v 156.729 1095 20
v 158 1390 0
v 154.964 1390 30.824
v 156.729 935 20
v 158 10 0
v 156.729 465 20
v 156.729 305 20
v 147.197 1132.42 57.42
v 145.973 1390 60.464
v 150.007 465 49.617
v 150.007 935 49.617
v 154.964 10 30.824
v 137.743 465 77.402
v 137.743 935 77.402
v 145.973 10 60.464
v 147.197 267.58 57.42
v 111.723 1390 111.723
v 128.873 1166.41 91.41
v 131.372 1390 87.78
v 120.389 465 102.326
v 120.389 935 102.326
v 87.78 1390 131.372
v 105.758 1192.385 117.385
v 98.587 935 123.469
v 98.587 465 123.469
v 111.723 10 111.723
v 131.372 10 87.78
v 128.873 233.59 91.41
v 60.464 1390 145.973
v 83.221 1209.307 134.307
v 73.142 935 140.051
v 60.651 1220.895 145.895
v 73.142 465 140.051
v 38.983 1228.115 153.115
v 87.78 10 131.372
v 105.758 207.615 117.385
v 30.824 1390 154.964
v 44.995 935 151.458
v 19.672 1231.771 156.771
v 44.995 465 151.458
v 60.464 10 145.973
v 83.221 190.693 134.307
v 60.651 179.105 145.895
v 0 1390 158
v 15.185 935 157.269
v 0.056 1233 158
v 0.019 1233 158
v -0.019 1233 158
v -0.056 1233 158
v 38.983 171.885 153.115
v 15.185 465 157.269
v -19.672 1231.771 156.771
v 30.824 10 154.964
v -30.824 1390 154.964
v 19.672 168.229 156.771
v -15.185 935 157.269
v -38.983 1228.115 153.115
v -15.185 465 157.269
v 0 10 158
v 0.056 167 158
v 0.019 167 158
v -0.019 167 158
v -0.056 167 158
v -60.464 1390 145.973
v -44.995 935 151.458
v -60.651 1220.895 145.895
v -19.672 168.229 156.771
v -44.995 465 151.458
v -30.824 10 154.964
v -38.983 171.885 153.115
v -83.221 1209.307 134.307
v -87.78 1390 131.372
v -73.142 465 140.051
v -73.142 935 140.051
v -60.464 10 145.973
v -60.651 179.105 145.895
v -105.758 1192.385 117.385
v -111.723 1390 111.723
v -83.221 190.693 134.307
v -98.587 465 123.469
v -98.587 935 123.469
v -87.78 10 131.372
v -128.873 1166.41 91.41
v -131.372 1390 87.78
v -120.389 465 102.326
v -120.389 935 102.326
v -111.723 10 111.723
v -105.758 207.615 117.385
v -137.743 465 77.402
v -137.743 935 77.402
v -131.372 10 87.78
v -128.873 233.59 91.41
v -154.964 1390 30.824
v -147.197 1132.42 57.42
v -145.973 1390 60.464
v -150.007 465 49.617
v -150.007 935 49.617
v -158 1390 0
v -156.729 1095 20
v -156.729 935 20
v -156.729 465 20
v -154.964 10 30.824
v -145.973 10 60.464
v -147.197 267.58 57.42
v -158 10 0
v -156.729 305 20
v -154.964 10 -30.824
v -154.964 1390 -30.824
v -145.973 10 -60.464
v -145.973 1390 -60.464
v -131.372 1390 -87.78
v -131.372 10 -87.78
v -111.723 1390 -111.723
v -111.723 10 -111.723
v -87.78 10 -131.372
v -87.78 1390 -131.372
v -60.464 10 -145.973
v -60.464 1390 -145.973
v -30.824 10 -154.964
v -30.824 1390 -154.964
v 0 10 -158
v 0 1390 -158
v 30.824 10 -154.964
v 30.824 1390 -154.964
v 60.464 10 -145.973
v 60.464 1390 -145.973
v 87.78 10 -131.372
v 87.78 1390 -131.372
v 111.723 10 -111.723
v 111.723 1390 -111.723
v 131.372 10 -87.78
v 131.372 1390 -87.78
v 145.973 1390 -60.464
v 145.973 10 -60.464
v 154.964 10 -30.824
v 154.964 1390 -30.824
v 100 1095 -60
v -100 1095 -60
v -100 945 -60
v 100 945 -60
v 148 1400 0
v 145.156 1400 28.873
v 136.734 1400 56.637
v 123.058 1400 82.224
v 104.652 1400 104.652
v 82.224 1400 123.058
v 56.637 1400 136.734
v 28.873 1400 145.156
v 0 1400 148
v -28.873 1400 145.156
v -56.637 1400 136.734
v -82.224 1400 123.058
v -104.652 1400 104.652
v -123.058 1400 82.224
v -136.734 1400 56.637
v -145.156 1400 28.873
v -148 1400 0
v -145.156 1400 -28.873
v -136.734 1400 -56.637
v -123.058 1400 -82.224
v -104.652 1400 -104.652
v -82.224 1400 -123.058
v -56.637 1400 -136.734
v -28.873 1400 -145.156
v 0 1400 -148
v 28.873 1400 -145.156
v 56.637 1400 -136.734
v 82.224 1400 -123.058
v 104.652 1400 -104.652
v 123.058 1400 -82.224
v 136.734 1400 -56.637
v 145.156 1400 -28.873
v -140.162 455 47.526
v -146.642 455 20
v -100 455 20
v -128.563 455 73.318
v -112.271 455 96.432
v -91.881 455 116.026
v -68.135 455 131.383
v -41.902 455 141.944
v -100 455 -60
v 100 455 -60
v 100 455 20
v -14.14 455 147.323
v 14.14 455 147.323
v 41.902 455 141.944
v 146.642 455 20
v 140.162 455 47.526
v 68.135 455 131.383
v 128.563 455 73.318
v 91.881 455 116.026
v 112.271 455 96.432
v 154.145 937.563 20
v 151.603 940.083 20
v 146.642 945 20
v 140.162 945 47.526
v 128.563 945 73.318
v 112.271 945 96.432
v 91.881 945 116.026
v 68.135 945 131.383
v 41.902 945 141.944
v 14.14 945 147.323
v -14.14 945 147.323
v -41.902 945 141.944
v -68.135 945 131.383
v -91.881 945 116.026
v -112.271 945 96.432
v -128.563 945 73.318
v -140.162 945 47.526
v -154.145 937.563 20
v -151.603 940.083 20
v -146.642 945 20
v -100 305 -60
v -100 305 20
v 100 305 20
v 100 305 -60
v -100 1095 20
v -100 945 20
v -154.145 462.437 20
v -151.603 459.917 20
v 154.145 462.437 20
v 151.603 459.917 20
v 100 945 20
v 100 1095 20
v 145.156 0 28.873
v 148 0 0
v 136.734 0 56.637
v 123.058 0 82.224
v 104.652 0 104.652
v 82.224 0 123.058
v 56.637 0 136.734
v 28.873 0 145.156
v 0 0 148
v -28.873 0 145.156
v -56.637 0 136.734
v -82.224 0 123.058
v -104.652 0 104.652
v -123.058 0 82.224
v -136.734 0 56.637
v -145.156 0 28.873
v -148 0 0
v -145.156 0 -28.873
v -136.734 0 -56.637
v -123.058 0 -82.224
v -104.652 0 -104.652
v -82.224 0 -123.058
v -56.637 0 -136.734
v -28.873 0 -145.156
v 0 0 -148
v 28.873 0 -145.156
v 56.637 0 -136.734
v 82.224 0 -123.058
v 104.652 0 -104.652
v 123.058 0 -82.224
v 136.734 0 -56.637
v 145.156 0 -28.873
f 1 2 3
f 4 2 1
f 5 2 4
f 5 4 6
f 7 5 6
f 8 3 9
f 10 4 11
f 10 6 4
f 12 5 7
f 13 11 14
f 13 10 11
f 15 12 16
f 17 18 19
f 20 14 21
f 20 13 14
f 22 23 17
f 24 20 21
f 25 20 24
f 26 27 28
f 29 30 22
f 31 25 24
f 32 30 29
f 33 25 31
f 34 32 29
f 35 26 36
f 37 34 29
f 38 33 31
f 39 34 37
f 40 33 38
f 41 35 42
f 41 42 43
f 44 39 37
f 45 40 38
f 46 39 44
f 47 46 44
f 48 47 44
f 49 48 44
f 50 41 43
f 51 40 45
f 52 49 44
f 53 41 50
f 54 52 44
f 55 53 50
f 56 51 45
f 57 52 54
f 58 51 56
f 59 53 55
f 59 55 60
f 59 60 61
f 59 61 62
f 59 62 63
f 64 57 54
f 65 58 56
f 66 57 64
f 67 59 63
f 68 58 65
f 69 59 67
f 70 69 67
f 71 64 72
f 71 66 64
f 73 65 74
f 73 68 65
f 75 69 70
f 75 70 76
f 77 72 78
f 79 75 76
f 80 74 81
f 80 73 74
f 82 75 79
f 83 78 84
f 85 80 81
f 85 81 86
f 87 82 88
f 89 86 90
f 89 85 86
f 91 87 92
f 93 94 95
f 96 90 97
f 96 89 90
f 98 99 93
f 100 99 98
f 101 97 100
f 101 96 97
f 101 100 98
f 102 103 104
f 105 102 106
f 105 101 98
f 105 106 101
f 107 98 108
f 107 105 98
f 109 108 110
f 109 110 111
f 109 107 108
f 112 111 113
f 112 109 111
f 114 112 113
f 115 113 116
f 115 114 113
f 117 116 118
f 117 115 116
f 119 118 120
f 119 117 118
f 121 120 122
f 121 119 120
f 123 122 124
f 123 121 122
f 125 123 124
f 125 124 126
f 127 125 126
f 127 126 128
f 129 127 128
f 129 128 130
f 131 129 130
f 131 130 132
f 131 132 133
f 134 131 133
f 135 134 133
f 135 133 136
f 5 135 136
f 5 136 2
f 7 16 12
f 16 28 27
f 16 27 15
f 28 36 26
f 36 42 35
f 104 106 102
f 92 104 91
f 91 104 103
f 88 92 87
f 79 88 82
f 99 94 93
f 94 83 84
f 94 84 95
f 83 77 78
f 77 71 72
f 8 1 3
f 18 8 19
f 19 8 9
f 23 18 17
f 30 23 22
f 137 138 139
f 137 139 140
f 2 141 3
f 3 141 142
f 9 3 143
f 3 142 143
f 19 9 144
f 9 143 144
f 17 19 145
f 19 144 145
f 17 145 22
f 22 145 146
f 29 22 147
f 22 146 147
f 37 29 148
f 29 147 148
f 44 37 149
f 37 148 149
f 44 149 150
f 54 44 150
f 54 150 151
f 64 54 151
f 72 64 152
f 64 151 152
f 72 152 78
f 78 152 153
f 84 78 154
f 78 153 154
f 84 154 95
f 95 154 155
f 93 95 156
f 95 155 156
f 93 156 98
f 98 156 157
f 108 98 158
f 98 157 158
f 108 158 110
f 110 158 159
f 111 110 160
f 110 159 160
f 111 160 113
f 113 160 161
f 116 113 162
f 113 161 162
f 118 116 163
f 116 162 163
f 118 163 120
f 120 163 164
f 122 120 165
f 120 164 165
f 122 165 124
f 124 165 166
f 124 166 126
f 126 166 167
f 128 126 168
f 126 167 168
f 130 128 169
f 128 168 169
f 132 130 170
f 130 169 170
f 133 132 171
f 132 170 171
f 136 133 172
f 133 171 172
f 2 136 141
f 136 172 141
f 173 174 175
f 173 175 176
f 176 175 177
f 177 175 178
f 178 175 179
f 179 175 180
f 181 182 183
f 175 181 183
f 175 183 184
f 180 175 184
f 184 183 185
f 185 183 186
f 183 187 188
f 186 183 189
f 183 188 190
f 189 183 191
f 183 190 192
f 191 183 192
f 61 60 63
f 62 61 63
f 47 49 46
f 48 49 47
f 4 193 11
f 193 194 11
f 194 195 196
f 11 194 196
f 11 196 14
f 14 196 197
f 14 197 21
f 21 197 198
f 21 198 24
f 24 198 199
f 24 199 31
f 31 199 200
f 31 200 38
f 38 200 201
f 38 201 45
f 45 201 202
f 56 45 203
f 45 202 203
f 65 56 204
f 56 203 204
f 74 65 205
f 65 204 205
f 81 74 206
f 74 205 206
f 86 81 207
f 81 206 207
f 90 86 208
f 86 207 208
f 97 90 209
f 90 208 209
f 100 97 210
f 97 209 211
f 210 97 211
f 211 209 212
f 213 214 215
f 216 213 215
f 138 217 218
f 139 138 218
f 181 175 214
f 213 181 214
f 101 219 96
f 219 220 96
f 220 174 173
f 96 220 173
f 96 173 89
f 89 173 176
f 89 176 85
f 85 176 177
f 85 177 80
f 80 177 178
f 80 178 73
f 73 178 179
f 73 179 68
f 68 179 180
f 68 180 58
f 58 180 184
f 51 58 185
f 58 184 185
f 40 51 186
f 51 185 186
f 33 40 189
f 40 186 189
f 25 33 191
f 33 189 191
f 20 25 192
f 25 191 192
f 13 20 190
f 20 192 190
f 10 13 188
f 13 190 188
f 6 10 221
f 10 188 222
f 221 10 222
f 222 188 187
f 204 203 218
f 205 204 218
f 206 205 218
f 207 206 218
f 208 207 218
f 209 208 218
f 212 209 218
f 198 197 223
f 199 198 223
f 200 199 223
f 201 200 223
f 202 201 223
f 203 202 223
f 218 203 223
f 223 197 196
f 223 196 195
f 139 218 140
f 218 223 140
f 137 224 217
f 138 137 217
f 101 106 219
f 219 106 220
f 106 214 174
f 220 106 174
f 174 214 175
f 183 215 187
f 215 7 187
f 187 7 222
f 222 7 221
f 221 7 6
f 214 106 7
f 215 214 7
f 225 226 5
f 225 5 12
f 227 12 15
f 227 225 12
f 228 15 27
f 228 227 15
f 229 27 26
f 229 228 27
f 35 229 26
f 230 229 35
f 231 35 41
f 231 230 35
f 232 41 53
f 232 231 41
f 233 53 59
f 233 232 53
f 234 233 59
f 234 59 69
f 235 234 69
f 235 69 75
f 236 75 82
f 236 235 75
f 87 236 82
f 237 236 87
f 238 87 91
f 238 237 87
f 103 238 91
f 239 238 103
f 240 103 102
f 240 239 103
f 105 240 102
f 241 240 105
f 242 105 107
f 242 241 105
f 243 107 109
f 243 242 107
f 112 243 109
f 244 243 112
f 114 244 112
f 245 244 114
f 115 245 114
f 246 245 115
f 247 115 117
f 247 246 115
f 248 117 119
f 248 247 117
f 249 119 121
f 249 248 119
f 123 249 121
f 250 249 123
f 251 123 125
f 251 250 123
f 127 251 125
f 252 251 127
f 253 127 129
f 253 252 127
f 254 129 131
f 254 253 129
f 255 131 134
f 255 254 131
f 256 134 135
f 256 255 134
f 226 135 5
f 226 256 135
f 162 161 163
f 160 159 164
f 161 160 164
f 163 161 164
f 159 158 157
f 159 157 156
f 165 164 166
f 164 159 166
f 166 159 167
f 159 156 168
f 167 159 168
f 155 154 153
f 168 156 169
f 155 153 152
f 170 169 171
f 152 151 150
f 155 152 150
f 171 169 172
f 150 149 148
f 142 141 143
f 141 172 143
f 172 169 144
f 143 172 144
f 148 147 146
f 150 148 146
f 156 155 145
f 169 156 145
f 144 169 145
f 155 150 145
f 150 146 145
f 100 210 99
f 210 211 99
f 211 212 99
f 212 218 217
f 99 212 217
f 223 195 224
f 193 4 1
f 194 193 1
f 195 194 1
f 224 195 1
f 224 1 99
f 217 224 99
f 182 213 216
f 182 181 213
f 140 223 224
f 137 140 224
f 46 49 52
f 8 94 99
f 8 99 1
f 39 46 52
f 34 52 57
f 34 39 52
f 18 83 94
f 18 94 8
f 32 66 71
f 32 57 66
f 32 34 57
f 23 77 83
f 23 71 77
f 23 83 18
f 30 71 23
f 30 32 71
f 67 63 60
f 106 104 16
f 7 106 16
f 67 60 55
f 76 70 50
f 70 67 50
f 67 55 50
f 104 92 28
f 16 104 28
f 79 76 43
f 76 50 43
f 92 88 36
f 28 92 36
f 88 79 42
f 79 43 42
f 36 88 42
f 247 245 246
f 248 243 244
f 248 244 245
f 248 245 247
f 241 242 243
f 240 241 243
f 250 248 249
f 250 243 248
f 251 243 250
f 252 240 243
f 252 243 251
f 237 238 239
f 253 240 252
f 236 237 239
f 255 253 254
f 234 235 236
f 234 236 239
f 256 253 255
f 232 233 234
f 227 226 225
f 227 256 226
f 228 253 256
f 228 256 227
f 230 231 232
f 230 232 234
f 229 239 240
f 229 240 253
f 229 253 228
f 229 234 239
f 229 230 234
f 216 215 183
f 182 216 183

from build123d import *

# Parameters (mm, degrees)
F0_R     = 158
F1_DEPTH = 1400
F3_DEPTH = 158.001
F4_DEPTH = 158.001
F5_SIZE  = 137.99999
F6_SIZE  = 137.99999
F9_DEPTH = 80
F10_SIZE = 10
F11_SIZE = 10


# Not quite as in the source:
# - a fillet or chamfer is up to 0.001 mm smaller than in the source, because OpenCascade refuses the exact size


with BuildPart() as f1:
    # F0 (on Front) → F1 (new body)
    with BuildSketch(Plane.XZ):
        Circle(F0_R)
    extrude(amount=-F1_DEPTH)

    # F2 (on Right) → F3 (cut, through all)
    with BuildSketch(Plane.YZ):
        Polygon((167, 20), (390, 20), (455, 20), (455, 158), (167, 158), align=None)
        Polygon((945, 158), (945, 20), (1010, 20), (1233, 20), (1233, 158), align=None)
    extrude(amount=-F3_DEPTH, mode=Mode.SUBTRACT)

    # F4 (cut, through all): faces of the model
    f4_faces = [f1.faces().sort_by_distance(p)[0] for p in [
        (0, 1089, 89),
        (0, 311, 89),
    ]]
    extrude(f4_faces, amount=-F4_DEPTH, mode=Mode.SUBTRACT)

    # F5 (size 138 in the source; OpenCascade refuses exactly that, so slightly less here)
    f5_edges = [f1.edges().sort_by_distance(p)[0] for p in [
        (0, 1233, 20),
    ]]
    chamfer(f5_edges, length=F5_SIZE)

    # F6 (size 138 in the source; OpenCascade refuses exactly that, so slightly less here)
    f6_edges = [f1.edges().sort_by_distance(p)[0] for p in [
        (0, 167, 20),
    ]]
    chamfer(f6_edges, length=F6_SIZE)

    # F7 (on face) + F8 (on face) → F9 (cut)
    with BuildSketch(Plane.XY.offset(20)):
        Polygon((100, 1095), (0, 1095), (-100, 1095), (-100, 945), (100, 945), align=None)
    with BuildSketch(Plane.XY.offset(20)):
        Polygon((-100, 305), (0, 305), (100, 305), (100, 455), (-100, 455), align=None)
    extrude(amount=-F9_DEPTH, mode=Mode.SUBTRACT)

    # F10
    f10_edges = [f1.edges().sort_by_distance(p)[0] for p in [
        (-158, 0, 0),
        (-158, 1400, 0),
    ]]
    chamfer(f10_edges, length=F10_SIZE)

    # F11
    f11_edges = [f1.edges().sort_by_distance(p)[0] for p in [
        (0, 455, 158),
        (0, 945, 158),
    ]]
    chamfer(f11_edges, length=F11_SIZE)


solid = f1.part
